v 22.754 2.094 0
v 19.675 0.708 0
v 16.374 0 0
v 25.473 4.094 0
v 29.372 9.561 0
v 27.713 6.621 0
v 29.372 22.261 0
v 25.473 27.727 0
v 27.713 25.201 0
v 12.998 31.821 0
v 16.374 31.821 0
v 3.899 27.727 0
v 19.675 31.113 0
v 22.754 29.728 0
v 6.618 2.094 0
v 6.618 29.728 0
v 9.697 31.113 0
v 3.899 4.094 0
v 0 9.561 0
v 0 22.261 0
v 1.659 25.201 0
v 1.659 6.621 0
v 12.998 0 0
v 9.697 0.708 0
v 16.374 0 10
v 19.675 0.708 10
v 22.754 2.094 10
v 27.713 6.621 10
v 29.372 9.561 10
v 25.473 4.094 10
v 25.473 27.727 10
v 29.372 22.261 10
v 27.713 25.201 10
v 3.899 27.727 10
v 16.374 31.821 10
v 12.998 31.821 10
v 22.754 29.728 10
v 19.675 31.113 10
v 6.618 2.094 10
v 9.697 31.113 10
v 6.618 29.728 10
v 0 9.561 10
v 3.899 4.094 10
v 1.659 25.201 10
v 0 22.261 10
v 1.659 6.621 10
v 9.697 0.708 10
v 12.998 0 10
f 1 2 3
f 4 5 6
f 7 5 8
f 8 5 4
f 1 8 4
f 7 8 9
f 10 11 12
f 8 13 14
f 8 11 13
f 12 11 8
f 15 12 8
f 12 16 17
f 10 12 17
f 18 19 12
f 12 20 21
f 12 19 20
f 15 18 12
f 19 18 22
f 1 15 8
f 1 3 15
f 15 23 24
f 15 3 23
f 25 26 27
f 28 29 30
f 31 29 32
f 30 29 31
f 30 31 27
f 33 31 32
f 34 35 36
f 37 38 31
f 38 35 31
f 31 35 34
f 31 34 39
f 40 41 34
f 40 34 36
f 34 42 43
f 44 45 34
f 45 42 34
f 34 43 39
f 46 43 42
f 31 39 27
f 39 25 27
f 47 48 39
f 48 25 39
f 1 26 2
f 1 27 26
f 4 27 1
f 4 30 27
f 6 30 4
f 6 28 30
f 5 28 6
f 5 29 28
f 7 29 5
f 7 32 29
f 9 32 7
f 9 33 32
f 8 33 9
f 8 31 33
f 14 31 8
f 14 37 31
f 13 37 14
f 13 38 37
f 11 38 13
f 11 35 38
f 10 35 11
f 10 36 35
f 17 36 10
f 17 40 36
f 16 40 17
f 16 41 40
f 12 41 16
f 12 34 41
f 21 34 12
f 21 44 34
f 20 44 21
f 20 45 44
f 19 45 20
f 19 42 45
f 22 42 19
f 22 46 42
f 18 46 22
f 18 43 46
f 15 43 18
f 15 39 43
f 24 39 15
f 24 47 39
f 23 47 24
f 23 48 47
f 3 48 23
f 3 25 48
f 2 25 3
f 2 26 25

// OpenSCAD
$fn = 32;

// ----------------------------------------------------------------------
// Flat adaptor: double_d, 10 mm thick
// ----------------------------------------------------------------------

// --- parameters (mm) ---
profile_height = 10;      // extrusion height
profile_points = 24;      // points of the closed outline

profile = [[29.372, 22.261], [27.713, 25.201], [25.473, 27.727], [22.754, 29.728], [19.675, 31.113], [16.374, 31.821], [12.998, 31.821], [9.697, 31.113], [6.618, 29.728], [3.899, 27.727], [1.659, 25.201], [0, 22.261], [0, 9.561], [1.659, 6.621], [3.899, 4.094], [6.618, 2.094], [9.697, 0.708], [12.998, 0], [16.374, 0], [19.675, 0.708], [22.754, 2.094], [25.473, 4.094], [27.713, 6.621], [29.372, 9.561]];  // single closed polygon, 24 points, counter clockwise

// --- the one profile operation ---
linear_extrude(height = profile_height) polygon(points = profile);
